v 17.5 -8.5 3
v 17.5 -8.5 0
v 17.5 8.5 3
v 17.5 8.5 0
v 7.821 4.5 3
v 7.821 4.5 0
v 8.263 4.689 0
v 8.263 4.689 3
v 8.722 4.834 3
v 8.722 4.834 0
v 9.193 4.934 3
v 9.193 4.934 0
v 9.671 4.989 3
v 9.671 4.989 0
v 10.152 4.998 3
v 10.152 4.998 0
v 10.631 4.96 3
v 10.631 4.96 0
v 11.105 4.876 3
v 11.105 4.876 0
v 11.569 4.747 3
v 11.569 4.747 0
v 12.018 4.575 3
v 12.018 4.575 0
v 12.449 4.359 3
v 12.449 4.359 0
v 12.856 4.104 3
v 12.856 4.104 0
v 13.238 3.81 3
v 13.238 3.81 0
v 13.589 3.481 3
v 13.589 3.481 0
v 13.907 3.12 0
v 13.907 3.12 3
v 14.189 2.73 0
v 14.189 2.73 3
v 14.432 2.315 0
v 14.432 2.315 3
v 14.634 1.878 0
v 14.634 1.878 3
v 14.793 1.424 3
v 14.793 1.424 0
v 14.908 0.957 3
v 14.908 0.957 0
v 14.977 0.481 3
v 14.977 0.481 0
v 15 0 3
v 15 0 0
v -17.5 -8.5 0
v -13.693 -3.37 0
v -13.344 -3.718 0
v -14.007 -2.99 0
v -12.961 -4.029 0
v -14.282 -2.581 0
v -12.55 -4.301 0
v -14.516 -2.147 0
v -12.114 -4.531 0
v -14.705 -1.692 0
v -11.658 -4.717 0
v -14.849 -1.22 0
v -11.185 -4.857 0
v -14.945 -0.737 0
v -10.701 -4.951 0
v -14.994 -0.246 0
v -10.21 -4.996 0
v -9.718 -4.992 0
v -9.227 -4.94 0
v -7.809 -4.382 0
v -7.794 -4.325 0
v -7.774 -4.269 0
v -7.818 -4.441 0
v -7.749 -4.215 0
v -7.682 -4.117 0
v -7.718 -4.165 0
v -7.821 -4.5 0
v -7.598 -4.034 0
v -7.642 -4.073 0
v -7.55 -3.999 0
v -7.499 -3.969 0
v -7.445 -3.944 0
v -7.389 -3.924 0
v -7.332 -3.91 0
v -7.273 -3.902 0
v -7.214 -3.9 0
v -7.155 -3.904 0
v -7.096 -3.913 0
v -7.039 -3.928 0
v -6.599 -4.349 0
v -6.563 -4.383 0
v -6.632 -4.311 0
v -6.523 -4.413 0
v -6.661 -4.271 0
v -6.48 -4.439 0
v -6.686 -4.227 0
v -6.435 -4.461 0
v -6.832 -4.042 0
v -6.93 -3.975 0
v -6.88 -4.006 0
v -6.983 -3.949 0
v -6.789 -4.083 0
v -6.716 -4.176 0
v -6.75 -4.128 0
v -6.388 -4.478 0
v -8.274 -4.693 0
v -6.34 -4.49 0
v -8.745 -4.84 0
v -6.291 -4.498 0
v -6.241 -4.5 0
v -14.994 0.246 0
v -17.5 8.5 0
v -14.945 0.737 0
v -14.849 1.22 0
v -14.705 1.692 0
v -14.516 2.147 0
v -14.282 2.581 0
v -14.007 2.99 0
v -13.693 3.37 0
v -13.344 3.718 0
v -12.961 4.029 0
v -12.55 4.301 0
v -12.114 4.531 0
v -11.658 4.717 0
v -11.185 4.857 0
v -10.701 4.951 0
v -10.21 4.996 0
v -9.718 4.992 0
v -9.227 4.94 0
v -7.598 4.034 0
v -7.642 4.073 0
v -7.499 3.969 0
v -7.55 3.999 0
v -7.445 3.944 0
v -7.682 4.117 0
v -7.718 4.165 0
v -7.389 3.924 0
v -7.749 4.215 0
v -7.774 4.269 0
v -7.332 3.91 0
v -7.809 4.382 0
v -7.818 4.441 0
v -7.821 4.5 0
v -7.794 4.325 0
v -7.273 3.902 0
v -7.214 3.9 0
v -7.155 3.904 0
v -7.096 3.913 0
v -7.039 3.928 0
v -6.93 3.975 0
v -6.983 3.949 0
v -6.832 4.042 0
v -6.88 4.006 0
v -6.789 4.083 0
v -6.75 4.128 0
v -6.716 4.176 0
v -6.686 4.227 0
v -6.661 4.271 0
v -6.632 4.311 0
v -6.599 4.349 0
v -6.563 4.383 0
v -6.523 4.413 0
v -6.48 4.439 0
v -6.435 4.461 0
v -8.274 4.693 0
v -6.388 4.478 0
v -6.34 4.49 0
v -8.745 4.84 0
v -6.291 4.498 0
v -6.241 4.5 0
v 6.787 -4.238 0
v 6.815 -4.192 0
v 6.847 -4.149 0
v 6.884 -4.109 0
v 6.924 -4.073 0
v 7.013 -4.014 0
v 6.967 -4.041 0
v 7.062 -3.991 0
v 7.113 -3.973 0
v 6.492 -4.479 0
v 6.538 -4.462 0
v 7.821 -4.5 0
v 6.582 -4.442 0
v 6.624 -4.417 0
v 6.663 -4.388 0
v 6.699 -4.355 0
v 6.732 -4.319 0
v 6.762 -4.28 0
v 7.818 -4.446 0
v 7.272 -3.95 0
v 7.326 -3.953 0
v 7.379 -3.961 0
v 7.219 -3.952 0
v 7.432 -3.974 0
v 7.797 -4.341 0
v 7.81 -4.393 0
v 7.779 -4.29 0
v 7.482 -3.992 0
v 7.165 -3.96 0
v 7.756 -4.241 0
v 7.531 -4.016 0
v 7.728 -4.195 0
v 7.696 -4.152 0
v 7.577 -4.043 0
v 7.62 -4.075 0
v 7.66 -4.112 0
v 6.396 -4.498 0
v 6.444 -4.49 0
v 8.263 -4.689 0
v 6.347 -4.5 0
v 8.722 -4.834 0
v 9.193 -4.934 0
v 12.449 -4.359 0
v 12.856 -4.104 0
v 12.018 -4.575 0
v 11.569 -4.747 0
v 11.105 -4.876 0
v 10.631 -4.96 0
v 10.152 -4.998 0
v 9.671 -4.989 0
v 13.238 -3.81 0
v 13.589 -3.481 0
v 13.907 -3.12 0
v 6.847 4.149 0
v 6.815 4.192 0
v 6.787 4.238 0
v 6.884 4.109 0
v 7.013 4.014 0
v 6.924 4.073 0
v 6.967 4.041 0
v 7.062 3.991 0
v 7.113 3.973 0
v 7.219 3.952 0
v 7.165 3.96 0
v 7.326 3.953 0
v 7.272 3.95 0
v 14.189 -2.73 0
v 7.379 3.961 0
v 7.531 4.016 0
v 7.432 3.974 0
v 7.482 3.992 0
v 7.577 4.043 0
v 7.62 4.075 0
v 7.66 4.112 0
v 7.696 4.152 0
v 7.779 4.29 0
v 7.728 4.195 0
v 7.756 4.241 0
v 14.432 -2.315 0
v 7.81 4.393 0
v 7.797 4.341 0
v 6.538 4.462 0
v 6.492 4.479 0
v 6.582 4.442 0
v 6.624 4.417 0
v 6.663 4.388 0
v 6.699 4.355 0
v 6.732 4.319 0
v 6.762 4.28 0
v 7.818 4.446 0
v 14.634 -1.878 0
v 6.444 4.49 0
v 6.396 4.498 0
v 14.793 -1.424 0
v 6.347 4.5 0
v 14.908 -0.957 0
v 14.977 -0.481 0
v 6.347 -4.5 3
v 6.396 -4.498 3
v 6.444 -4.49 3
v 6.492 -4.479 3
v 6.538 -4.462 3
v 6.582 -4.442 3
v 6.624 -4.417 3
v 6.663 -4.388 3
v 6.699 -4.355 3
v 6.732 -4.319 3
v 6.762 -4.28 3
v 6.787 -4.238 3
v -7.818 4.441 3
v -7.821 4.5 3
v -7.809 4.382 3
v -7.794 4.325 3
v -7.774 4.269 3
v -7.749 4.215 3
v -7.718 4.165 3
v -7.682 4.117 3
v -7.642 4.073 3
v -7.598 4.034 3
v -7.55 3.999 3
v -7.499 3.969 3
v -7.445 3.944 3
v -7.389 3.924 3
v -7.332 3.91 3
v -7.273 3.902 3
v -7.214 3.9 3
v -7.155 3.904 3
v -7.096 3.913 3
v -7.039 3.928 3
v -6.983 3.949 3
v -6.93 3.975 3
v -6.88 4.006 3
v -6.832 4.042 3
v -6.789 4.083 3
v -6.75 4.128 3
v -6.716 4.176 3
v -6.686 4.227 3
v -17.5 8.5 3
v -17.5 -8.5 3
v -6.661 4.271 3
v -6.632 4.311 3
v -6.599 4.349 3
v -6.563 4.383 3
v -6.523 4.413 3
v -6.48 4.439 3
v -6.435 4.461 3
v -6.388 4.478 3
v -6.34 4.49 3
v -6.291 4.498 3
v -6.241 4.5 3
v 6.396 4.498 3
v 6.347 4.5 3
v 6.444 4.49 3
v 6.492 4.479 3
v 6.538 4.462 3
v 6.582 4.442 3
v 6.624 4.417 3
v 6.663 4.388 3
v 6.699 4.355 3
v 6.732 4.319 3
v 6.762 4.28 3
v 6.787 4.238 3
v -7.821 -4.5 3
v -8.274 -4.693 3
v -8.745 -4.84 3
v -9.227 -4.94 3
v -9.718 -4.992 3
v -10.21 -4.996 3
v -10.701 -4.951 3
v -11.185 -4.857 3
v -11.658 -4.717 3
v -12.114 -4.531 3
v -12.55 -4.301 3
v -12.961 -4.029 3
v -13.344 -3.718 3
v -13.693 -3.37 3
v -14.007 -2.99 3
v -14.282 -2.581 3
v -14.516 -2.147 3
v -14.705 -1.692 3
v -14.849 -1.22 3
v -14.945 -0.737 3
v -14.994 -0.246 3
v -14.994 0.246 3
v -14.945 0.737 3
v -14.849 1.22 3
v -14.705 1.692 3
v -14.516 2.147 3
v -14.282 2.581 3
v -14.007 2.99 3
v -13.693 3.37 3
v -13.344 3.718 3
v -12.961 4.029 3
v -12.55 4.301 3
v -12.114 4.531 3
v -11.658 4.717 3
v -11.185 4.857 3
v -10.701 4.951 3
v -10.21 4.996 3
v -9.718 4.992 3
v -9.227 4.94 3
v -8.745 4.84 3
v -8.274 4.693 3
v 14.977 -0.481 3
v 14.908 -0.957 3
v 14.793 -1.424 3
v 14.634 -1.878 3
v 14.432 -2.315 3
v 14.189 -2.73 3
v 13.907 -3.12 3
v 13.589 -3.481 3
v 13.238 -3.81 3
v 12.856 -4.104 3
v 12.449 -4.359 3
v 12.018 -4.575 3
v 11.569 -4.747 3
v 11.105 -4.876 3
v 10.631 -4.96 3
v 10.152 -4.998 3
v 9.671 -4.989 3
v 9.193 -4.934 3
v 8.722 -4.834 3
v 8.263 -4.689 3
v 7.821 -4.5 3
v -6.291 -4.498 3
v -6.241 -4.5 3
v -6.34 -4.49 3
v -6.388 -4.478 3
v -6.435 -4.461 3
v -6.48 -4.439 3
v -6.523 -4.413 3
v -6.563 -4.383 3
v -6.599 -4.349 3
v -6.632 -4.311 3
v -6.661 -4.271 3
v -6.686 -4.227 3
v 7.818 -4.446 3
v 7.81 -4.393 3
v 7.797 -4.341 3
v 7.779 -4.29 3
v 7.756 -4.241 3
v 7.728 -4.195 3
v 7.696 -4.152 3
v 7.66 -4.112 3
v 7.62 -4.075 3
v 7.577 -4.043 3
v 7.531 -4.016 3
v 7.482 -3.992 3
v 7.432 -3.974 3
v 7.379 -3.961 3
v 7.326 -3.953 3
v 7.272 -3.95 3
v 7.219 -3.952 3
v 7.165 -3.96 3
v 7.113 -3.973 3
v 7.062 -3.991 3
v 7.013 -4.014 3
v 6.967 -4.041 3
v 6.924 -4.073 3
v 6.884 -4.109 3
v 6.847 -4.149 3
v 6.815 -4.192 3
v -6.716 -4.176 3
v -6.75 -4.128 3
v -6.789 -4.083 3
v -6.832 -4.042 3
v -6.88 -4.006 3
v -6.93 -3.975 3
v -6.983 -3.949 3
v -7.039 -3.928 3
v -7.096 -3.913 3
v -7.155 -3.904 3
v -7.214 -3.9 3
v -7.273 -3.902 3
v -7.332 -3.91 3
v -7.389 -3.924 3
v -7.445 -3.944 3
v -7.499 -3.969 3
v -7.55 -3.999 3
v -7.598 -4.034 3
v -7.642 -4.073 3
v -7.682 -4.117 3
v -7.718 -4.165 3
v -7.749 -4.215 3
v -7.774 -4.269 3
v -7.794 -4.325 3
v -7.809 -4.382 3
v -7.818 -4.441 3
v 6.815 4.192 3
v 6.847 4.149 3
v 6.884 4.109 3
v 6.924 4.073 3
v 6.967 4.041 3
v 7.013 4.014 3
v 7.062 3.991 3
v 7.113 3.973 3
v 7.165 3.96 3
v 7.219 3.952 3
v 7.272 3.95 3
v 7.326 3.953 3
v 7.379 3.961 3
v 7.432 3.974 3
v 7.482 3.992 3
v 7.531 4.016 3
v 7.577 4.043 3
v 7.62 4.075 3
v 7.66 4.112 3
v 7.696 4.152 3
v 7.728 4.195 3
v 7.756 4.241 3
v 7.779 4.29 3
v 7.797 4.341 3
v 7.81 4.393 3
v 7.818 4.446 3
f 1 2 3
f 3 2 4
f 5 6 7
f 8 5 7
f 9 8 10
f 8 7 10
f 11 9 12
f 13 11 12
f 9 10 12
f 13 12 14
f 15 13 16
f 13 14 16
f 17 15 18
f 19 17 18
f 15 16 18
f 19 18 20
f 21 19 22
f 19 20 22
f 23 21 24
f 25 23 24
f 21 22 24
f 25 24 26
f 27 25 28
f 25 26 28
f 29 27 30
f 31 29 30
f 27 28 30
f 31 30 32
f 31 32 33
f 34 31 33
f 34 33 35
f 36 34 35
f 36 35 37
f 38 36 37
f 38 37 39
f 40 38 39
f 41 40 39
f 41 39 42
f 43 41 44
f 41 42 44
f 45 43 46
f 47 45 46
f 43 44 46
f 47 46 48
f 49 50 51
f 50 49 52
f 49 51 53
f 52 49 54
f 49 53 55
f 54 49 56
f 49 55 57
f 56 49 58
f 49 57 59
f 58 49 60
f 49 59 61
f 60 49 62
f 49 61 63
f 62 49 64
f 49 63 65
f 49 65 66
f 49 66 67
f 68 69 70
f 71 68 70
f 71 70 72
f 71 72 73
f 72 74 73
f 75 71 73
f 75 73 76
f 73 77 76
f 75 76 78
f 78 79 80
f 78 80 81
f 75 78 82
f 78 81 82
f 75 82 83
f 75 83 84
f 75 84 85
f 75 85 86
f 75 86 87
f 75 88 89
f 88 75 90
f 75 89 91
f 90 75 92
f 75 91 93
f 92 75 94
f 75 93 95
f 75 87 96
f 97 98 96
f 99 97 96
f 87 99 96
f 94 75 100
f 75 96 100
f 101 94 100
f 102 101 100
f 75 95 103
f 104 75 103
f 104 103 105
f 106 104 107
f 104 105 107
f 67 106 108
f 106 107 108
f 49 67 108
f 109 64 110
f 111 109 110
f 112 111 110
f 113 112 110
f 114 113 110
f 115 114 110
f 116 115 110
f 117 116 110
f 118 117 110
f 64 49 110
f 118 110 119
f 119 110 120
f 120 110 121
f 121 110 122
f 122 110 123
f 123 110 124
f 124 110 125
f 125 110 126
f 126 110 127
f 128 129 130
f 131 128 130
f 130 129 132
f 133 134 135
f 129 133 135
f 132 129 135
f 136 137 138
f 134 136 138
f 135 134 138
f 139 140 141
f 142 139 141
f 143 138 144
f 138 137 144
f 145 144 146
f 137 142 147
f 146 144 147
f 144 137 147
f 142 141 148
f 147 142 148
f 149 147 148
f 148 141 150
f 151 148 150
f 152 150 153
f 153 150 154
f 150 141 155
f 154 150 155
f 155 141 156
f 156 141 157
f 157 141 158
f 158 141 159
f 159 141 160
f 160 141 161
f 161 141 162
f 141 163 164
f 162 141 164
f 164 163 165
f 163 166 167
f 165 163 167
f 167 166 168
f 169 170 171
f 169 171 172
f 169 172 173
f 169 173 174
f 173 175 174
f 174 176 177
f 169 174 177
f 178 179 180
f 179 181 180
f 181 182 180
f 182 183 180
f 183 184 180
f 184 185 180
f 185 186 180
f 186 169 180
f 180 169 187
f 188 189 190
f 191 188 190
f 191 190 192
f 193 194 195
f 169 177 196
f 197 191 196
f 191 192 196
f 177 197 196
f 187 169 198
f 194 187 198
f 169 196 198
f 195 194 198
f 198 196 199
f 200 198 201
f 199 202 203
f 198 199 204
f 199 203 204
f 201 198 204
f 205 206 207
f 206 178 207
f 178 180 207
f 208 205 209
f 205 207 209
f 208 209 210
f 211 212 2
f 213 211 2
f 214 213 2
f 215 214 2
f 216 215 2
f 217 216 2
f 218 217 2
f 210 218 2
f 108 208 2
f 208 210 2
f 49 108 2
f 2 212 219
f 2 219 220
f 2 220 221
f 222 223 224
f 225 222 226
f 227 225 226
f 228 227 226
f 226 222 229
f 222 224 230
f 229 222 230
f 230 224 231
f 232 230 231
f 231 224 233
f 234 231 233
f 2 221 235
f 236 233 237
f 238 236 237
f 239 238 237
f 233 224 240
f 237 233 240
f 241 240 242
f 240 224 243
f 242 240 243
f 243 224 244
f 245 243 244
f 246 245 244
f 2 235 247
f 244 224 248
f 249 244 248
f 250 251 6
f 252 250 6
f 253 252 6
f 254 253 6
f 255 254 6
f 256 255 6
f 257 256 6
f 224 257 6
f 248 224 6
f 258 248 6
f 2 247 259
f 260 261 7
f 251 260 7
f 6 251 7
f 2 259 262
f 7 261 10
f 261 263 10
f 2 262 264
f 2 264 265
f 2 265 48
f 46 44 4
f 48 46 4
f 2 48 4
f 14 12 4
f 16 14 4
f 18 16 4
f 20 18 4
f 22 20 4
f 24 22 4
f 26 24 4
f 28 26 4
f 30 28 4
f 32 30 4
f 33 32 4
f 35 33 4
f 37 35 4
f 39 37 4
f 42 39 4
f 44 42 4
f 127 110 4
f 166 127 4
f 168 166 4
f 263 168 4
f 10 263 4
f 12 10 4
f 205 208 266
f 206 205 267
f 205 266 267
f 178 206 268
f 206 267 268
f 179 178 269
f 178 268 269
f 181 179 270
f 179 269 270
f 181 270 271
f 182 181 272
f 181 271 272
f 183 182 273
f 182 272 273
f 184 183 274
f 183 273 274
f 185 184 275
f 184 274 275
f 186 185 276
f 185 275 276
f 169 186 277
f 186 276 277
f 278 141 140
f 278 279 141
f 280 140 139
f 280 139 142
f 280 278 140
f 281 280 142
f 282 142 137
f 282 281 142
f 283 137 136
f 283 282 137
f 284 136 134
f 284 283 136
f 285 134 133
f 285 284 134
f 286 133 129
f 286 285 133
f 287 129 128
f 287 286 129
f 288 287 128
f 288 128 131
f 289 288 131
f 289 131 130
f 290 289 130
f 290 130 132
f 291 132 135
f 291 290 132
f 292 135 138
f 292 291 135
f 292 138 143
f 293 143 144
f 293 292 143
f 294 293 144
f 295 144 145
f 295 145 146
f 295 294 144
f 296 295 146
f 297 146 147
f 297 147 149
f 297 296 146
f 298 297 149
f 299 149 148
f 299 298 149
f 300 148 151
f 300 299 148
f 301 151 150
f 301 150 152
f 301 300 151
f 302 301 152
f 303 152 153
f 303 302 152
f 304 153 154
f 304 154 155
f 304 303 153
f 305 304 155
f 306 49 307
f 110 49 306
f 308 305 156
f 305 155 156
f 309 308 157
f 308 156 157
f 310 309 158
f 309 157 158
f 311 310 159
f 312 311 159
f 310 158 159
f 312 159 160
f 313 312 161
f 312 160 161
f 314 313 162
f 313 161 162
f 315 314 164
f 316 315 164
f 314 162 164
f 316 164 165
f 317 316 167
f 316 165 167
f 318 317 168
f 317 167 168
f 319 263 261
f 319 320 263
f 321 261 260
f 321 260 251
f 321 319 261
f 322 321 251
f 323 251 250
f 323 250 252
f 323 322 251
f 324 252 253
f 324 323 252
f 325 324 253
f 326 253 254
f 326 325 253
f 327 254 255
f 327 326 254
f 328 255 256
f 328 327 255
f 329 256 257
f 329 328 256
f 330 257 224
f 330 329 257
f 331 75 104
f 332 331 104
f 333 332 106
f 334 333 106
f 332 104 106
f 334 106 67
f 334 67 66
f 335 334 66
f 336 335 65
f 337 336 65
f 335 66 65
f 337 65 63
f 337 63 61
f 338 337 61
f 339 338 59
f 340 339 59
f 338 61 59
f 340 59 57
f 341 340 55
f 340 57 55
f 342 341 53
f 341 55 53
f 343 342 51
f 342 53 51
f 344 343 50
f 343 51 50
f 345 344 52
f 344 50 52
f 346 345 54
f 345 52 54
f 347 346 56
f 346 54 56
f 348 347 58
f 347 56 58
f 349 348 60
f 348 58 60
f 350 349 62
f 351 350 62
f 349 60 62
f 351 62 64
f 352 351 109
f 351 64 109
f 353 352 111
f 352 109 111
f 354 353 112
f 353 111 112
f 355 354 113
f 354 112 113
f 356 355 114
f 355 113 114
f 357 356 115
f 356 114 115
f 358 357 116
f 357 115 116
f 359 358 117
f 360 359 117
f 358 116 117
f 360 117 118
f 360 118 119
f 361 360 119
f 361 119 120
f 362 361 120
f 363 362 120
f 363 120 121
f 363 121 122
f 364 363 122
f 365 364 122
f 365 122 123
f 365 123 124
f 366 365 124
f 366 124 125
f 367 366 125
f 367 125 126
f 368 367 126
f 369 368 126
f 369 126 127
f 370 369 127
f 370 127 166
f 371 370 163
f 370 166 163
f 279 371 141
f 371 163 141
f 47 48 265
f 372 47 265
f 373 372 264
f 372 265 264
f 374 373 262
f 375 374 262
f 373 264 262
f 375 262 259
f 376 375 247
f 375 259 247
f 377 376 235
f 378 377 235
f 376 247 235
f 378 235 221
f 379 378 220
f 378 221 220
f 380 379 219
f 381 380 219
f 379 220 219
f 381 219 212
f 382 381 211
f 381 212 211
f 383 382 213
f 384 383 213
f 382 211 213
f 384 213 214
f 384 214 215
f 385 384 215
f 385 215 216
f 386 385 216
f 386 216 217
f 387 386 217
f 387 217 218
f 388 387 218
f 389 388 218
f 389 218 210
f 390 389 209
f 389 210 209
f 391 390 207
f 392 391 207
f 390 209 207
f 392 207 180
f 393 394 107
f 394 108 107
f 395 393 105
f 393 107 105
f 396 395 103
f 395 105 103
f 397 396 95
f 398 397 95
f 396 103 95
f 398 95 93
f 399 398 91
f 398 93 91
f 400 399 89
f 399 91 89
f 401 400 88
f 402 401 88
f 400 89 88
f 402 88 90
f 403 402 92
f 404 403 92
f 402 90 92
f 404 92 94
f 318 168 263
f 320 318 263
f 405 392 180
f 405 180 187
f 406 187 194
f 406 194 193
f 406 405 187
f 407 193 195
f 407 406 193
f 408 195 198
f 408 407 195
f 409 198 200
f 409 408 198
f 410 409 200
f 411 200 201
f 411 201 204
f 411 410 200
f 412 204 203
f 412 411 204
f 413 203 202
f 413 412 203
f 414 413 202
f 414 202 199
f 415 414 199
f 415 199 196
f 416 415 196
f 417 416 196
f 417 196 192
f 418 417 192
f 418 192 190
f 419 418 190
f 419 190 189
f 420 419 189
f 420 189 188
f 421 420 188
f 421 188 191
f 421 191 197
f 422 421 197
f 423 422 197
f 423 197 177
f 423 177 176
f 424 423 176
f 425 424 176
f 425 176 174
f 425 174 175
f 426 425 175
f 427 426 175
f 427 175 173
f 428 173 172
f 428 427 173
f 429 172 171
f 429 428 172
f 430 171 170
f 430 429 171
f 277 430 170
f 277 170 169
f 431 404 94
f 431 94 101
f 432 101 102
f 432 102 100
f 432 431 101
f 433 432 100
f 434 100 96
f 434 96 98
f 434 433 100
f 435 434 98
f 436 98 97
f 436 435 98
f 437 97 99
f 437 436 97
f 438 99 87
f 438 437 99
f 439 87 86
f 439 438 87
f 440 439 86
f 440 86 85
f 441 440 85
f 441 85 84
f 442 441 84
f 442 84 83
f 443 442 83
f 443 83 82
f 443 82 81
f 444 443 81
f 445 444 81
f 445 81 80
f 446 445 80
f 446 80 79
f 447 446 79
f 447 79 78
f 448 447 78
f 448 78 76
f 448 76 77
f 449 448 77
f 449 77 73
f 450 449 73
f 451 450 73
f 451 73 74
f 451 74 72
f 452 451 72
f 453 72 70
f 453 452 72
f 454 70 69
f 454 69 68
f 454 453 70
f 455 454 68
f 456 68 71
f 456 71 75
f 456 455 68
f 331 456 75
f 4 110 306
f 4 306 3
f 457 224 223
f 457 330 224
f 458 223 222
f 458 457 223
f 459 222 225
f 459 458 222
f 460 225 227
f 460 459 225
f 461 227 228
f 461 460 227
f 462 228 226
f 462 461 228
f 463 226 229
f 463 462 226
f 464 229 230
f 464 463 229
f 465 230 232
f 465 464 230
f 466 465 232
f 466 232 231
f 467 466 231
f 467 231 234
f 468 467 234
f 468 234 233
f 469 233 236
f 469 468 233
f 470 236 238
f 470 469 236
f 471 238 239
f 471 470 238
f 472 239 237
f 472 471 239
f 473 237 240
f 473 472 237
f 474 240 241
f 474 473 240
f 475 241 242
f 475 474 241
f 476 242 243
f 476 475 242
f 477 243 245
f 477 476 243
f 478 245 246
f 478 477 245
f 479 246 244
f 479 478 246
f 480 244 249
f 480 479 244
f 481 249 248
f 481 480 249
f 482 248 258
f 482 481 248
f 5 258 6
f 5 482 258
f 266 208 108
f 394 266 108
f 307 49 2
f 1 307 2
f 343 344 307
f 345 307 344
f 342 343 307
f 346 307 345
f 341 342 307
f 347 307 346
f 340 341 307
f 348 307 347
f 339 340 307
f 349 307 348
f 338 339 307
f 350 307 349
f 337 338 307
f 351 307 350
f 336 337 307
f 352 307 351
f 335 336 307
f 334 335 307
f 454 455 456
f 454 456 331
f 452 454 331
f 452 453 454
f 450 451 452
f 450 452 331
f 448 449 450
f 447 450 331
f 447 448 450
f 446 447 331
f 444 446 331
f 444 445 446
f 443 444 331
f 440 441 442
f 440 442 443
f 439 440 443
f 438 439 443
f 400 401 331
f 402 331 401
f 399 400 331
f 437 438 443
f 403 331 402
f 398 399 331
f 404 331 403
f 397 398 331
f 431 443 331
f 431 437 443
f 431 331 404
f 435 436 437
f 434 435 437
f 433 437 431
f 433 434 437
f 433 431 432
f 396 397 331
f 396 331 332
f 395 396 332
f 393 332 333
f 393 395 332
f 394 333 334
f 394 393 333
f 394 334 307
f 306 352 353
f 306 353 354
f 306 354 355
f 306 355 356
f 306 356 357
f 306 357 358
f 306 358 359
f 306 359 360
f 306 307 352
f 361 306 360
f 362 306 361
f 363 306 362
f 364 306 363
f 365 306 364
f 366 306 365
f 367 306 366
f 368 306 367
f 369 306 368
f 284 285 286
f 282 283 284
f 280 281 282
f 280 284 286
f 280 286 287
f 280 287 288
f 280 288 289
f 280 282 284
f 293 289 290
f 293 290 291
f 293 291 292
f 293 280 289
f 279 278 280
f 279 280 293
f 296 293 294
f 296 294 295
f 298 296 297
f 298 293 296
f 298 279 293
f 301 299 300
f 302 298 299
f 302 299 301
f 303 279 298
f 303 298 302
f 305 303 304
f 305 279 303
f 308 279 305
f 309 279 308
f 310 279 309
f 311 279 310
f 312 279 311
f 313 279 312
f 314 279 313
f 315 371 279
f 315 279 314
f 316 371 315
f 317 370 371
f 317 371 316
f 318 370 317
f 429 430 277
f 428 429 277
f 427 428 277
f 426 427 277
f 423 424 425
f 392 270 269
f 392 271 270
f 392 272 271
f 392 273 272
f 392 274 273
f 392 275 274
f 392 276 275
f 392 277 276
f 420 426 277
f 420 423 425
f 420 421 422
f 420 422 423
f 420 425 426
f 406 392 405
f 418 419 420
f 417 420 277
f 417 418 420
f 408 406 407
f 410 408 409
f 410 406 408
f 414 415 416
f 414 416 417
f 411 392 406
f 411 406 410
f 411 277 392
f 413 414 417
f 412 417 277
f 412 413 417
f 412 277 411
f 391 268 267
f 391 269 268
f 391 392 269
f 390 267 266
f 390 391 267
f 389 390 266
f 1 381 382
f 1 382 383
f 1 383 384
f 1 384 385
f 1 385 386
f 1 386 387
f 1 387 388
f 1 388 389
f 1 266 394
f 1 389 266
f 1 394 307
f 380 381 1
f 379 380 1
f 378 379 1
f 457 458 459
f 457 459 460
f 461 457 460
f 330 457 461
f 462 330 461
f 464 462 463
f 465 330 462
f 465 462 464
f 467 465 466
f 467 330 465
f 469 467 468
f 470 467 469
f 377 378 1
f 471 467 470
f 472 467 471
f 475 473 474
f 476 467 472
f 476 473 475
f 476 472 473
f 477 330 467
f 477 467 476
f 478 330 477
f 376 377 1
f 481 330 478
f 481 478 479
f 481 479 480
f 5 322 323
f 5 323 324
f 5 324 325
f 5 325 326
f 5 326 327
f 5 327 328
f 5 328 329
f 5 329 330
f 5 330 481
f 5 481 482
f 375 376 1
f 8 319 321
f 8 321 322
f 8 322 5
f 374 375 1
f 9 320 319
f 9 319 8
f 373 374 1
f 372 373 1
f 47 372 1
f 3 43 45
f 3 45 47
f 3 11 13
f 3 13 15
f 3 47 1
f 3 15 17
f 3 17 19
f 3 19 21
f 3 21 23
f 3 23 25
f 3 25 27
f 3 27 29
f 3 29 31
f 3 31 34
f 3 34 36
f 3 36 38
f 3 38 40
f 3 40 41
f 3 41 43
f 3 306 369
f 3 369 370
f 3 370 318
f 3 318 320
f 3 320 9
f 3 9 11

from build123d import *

# Parameters (mm, degrees)
SKETCH_1_W      = 35
SKETCH_1_H      = 17
EXTRUDE_1_DEPTH = 3
SKETCH_2_R      = 0.6
SKETCH_2_R_2    = 0.55
EXTRUDE_2_DEPTH = 3
FILLET_1_R      = 0.5


with BuildPart() as part:
    # 스케치1 → 보스-돌출1 (new body)
    with BuildSketch(Plane.XY):
        Rectangle(SKETCH_1_W, SKETCH_1_H)
        with BuildLine():
            Line((7.820550528, -4.5), (-7.820550528, -4.5))
            ThreePointArc((-7.820550528, -4.5), (-15, 0), (-7.820550528, 4.5))
            Line((-7.820550528, 4.5), (7.820550528, 4.5))
            ThreePointArc((7.820550528, 4.5), (12.655442773, 4.236581603), (15, 0))
            ThreePointArc((15, 0), (12.655442773, -4.236581603), (7.820550528, -4.5))
        make_face(mode=Mode.SUBTRACT)
    extrude(amount=EXTRUDE_1_DEPTH)

    # 스케치2 → 보스-돌출2 (add)
    with BuildSketch(Plane.XY.offset(3)):
        with Locations((-7.220550528, 4.5)):
            Circle(SKETCH_2_R)
        with Locations((-7.220550528, -4.5)):
            Circle(SKETCH_2_R)
        with Locations((7.270550528, -4.5)):
            Circle(SKETCH_2_R_2)
        with Locations((7.270550528, 4.5)):
            Circle(SKETCH_2_R_2)
    extrude(amount=-EXTRUDE_2_DEPTH)

    # 필렛1
    fillet_1_edges = [part.edges().sort_by_distance(p)[0] for p in [
        (-6.620550528, 4.5, 1.5),
        (-6.620550528, -4.5, 1.5),
        (6.720550528, -4.5, 1.5),
        (6.720550528, 4.5, 1.5),
    ]]
    fillet(fillet_1_edges, radius=FILLET_1_R)


solid = part.part
